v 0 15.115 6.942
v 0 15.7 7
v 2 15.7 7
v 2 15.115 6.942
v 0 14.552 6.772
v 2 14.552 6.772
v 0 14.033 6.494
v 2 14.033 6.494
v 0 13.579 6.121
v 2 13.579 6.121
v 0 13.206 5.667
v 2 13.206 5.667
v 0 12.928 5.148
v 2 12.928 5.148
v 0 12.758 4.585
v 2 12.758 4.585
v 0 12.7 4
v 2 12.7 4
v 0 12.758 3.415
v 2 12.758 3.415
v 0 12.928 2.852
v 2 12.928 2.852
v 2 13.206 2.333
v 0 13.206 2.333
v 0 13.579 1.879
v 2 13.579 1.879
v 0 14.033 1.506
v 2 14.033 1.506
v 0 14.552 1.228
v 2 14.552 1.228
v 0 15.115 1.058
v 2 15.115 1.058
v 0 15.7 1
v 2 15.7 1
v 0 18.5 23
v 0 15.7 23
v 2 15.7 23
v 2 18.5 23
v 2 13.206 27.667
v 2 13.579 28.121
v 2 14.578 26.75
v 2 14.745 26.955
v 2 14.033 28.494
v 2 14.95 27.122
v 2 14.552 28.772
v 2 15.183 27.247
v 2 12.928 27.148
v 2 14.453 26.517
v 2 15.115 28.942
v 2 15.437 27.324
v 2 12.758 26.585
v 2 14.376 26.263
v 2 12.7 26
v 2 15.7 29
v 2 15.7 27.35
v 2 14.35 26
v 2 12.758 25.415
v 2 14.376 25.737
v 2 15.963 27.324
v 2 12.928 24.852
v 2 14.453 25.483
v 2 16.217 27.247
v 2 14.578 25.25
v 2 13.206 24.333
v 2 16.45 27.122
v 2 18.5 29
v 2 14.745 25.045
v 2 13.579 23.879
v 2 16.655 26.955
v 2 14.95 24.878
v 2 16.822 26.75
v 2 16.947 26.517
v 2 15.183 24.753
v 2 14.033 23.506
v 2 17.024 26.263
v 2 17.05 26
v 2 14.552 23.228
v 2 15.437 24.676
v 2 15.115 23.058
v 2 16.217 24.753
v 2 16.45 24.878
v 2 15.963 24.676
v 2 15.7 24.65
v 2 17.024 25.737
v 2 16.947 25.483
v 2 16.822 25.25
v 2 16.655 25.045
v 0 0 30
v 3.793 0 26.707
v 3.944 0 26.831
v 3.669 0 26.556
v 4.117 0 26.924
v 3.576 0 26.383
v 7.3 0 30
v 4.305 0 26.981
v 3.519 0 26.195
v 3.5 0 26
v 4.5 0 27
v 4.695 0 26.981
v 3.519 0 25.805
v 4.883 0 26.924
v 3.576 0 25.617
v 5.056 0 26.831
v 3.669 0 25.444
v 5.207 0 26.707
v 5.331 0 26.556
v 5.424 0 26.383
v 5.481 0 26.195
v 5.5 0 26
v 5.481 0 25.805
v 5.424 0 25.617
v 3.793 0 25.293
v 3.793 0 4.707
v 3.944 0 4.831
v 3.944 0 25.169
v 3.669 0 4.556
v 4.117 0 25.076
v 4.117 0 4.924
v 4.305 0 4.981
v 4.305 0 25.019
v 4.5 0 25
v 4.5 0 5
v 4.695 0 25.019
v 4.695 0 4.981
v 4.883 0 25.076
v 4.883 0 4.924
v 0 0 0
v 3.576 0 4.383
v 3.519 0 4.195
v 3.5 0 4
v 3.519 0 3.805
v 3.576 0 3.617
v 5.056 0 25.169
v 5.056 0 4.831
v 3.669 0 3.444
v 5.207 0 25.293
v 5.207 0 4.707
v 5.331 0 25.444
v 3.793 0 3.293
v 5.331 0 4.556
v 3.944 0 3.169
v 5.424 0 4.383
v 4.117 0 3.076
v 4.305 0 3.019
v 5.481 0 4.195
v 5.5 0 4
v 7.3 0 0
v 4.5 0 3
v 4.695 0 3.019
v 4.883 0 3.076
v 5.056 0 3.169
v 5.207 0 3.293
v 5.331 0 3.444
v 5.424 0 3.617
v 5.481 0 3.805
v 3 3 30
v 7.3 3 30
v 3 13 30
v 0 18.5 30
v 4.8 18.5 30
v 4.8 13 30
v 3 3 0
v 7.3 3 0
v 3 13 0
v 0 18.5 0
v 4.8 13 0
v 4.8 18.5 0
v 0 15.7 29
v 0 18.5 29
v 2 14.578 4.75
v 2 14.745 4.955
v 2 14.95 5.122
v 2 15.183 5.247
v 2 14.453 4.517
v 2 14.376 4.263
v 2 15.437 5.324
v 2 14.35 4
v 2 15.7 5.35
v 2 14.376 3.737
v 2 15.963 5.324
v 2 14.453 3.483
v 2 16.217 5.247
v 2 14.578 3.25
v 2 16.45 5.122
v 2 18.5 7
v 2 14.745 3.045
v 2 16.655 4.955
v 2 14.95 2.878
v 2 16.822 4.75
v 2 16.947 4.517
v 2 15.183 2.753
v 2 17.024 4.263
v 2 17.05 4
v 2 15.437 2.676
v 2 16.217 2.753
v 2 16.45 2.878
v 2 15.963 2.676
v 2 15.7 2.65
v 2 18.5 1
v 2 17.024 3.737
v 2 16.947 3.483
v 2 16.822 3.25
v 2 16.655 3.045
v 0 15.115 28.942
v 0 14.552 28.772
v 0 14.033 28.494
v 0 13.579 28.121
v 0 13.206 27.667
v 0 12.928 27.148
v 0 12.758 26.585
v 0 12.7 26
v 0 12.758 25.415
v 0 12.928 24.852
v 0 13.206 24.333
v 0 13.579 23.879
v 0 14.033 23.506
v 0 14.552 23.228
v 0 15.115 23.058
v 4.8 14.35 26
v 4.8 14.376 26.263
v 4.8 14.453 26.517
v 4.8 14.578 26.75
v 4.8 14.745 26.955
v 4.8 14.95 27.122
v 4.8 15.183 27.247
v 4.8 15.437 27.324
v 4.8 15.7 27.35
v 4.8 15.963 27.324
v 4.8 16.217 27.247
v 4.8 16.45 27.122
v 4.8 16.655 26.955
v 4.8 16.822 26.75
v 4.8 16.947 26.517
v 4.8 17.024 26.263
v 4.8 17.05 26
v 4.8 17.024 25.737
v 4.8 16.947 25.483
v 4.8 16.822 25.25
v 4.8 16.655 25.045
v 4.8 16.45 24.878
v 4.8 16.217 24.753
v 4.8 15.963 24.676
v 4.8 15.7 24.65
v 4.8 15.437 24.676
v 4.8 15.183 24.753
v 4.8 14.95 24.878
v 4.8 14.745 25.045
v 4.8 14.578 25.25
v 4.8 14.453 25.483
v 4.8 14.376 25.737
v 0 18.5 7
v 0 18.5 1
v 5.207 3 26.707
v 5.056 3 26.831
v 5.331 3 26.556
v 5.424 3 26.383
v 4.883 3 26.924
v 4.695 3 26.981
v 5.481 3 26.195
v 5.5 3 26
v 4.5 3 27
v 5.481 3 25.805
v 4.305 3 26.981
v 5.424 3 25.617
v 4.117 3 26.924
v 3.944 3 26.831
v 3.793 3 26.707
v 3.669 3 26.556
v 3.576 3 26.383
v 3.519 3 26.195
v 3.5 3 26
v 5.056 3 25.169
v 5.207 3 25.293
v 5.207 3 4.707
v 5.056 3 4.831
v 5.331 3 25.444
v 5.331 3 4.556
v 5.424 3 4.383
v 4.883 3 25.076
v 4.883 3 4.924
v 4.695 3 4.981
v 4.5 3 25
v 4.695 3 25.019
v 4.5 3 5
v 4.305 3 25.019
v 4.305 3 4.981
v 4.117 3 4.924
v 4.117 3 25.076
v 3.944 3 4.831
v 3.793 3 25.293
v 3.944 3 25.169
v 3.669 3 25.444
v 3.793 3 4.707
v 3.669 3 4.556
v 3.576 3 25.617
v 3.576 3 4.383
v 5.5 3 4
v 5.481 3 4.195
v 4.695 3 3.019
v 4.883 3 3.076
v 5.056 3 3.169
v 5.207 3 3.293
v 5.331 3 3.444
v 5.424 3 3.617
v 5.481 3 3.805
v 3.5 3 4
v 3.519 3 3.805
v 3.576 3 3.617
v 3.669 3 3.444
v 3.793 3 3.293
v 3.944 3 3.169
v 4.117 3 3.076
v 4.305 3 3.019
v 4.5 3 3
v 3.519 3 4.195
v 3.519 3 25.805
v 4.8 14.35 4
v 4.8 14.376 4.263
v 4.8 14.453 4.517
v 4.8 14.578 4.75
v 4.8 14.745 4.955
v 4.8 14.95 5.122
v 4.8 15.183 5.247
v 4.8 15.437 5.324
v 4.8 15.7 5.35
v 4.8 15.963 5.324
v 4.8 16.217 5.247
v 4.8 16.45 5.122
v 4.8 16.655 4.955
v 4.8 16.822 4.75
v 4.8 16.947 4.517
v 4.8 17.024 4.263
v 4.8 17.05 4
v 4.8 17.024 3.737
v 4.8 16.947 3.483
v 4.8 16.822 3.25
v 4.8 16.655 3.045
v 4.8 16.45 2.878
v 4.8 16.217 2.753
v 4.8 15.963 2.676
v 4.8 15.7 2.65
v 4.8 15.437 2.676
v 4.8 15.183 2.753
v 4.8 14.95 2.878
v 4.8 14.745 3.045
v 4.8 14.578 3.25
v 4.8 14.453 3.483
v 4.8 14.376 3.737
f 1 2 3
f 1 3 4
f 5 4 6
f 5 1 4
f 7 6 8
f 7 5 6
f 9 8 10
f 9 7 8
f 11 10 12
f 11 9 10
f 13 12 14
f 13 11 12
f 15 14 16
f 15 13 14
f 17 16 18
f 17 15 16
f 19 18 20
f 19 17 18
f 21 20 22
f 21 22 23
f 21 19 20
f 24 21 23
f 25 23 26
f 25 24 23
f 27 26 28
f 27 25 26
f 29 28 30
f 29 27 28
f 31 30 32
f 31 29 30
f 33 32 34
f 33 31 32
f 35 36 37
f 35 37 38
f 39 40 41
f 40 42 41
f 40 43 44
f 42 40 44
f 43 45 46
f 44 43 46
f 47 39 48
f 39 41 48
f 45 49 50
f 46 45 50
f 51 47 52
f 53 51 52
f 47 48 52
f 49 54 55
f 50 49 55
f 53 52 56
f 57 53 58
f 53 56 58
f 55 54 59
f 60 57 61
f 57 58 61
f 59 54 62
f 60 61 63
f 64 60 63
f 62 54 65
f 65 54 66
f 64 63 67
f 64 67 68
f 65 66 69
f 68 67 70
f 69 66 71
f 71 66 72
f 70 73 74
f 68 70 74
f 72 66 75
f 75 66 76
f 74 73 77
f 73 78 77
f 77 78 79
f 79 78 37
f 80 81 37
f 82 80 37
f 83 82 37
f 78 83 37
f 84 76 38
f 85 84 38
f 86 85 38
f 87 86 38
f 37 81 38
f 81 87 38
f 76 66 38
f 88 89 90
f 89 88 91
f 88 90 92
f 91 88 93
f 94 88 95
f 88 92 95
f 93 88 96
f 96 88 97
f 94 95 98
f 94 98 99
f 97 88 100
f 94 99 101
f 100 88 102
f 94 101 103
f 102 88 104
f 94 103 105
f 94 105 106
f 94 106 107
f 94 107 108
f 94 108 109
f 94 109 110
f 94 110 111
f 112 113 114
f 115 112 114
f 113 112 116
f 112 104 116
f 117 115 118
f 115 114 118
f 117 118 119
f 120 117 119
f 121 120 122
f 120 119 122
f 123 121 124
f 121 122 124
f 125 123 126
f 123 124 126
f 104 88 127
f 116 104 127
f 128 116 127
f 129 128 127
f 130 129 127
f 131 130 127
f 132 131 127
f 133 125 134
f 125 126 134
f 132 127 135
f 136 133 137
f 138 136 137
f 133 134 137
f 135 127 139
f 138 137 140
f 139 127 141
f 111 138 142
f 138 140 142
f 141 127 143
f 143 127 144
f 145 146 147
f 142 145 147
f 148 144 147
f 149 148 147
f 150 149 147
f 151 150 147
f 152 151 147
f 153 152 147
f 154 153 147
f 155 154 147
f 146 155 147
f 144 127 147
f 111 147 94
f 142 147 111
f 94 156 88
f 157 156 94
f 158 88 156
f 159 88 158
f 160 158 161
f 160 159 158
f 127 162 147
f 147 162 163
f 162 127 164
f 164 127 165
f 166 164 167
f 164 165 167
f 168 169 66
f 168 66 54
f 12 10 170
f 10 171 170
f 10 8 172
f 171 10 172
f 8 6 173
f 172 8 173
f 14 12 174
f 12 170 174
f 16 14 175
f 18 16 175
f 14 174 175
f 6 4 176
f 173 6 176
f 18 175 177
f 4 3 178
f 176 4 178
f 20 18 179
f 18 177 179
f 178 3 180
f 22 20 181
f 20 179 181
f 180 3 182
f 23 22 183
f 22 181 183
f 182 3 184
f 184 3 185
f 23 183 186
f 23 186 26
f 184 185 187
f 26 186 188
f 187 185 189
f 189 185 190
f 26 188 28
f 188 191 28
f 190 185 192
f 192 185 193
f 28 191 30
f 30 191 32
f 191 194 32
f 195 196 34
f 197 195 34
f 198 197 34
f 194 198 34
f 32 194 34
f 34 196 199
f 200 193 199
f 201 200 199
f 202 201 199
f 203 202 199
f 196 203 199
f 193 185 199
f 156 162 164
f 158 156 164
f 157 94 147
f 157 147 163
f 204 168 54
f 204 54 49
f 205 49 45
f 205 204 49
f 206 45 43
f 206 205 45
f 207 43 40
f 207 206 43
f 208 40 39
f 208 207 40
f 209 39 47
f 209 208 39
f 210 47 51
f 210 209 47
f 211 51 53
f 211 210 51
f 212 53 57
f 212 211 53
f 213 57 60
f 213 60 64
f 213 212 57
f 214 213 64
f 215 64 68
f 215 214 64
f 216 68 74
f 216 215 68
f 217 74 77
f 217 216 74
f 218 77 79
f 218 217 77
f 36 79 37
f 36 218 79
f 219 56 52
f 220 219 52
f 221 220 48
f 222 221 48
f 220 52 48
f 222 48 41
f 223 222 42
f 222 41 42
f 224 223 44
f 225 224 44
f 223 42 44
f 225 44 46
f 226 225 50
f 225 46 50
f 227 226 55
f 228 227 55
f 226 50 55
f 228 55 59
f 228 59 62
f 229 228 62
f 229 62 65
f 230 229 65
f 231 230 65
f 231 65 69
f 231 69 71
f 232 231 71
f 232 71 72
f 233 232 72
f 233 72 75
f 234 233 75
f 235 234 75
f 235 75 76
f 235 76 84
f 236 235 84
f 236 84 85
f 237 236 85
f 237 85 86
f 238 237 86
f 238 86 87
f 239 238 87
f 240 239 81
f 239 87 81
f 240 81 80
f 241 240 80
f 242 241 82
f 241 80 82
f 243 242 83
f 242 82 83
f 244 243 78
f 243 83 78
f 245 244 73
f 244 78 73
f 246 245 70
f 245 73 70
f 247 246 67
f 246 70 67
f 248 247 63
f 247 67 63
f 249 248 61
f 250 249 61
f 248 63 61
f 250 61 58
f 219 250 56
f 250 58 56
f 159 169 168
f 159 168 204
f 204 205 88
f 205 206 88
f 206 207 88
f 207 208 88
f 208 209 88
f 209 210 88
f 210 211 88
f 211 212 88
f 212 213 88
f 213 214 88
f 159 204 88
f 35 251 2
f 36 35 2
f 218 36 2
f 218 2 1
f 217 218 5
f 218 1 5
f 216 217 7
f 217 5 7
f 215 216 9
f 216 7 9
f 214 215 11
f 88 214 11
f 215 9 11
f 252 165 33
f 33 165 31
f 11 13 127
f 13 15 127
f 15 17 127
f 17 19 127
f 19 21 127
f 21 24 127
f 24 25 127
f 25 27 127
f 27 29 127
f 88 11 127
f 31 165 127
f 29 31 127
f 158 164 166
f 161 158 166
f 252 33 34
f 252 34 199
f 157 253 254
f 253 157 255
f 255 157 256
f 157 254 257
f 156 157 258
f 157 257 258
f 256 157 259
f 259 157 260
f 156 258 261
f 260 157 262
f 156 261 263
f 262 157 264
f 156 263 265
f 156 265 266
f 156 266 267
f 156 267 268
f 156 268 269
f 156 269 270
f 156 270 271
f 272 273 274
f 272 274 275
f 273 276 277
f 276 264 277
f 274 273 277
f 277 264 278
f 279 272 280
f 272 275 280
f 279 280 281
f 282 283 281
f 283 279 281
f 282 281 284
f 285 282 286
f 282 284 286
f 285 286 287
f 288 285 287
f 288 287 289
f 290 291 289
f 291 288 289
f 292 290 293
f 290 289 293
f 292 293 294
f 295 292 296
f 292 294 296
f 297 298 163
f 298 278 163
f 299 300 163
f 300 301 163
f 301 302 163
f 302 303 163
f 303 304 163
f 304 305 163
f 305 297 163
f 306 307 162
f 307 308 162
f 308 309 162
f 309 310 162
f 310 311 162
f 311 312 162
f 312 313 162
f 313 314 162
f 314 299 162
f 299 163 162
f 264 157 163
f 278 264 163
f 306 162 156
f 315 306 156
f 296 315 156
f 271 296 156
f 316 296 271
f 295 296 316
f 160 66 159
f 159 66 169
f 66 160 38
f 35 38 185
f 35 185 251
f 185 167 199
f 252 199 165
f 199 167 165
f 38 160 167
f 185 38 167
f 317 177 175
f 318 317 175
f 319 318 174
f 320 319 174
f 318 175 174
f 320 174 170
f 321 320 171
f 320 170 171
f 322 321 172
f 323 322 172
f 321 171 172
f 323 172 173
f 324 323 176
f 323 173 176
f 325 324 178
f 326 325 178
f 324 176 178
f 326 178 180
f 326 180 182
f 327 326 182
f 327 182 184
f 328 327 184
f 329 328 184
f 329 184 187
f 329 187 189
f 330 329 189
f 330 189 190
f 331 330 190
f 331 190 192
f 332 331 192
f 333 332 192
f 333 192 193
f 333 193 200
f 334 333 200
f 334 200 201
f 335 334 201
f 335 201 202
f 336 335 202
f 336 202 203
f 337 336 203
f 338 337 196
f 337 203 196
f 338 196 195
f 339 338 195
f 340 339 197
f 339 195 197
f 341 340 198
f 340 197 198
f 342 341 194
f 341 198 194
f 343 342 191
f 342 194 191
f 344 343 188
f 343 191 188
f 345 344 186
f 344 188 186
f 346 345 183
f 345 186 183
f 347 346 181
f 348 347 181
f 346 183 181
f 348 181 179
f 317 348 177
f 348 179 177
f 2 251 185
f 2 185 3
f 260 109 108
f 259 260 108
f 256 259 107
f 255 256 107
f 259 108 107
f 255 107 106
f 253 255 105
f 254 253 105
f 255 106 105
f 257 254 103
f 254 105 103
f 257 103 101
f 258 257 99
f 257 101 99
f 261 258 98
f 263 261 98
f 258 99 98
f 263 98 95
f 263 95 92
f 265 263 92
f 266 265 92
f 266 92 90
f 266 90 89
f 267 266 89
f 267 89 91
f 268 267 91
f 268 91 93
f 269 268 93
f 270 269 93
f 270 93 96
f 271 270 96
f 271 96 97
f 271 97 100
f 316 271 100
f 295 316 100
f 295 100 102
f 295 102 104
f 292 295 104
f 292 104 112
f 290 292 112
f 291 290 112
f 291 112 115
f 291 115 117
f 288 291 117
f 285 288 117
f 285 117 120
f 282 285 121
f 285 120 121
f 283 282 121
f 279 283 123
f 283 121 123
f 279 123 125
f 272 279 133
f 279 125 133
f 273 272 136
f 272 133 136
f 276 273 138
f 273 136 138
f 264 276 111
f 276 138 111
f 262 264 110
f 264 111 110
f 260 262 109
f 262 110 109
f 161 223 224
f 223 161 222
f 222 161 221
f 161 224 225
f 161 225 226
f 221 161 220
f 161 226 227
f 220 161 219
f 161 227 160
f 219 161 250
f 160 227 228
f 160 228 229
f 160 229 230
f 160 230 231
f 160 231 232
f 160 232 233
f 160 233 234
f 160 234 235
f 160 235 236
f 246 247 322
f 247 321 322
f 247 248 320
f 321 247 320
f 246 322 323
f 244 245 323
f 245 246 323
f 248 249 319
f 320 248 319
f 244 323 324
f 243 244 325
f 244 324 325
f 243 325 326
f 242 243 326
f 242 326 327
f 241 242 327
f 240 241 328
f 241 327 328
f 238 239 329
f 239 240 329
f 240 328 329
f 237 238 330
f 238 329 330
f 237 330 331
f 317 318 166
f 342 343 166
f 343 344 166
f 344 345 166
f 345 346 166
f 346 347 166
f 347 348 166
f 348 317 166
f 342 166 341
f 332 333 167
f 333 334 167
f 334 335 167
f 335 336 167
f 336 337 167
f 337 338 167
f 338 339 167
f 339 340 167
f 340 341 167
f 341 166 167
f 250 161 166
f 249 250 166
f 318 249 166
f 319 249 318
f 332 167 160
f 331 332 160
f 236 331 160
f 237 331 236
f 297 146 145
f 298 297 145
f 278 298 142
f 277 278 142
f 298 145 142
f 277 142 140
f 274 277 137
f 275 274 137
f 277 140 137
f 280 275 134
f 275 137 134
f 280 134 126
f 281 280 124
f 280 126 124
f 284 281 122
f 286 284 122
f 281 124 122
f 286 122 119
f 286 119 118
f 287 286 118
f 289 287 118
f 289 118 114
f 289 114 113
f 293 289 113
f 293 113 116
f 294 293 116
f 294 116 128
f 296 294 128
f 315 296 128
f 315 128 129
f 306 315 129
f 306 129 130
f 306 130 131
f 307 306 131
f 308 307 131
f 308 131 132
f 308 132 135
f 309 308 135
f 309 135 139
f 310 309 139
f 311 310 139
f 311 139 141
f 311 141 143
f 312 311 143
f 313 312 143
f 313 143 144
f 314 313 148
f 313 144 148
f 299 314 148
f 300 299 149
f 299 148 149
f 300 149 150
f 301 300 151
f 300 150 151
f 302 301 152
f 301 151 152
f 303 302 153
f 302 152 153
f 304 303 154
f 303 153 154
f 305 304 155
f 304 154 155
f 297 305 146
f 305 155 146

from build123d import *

# Parameters (mm, degrees)
EXTRUDE_1_DEPTH     = 30
CUT_EXTRUDE_1_REACH = 37.994
SKETCH_2_R          = 1
CUT_EXTRUDE_2_REACH = 37.994
SKETCH_3_R          = 1.35
CUT_EXTRUDE_3_DEPTH = 2


with BuildPart() as part:
    # 草图1 → 凸台-拉伸1 (new body)
    with BuildSketch(Plane.XY):
        Polygon((0, 0), (7.3, 0), (7.3, 3), (3, 3), (3, 13), (4.8, 13), (4.8, 18.5), (0, 18.5), align=None)
    extrude(amount=EXTRUDE_1_DEPTH)

    # 草图2 → 切除-拉伸1 (cut, up to next)
    with BuildSketch(Plane.XZ, mode=Mode.PRIVATE) as cut_extrude_1_sk1:
        with Locations((4.5, 26)):
            Circle(SKETCH_2_R)
    cut_extrude_1_tool1 = extrude(cut_extrude_1_sk1.sketch, amount=-CUT_EXTRUDE_1_REACH, mode=Mode.PRIVATE) & part.part
    # 草图2 → 切除-拉伸1 (cut, up to next)
    with BuildSketch(Plane.XZ, mode=Mode.PRIVATE) as cut_extrude_1_sk2:
        with Locations((4.5, 4)):
            Circle(SKETCH_2_R)
    cut_extrude_1_tool2 = extrude(cut_extrude_1_sk2.sketch, amount=-CUT_EXTRUDE_1_REACH, mode=Mode.PRIVATE) & part.part
    add(cut_extrude_1_tool1.solids().sort_by_distance((4.5, 0, 26))[0], mode=Mode.SUBTRACT)
    add(cut_extrude_1_tool2.solids().sort_by_distance((4.5, 0, 4))[0], mode=Mode.SUBTRACT)

    # 草图3 → 切除-拉伸2 (cut, up to next)
    with BuildSketch(Plane.ZY, mode=Mode.PRIVATE) as cut_extrude_2_sk1:
        with Locations(Location((4, 15.7, 0), (0, 0, 270))):
            Circle(SKETCH_3_R)
    cut_extrude_2_tool1 = extrude(cut_extrude_2_sk1.sketch, amount=-CUT_EXTRUDE_2_REACH, mode=Mode.PRIVATE) & part.part
    # 草图3 → 切除-拉伸2 (cut, up to next)
    with BuildSketch(Plane.ZY, mode=Mode.PRIVATE) as cut_extrude_2_sk2:
        with Locations(Location((26, 15.7, 0), (0, 0, 270))):
            Circle(SKETCH_3_R)
    cut_extrude_2_tool2 = extrude(cut_extrude_2_sk2.sketch, amount=-CUT_EXTRUDE_2_REACH, mode=Mode.PRIVATE) & part.part
    add(cut_extrude_2_tool1.solids().sort_by_distance((0, 15.7, 4))[0], mode=Mode.SUBTRACT)
    add(cut_extrude_2_tool2.solids().sort_by_distance((0, 15.7, 26))[0], mode=Mode.SUBTRACT)

    # 草图4 → 切除-拉伸3 (cut)
    with BuildSketch(Plane.ZY):
        with BuildLine():
            Line((1, 15.7), (1, 18.7))
            Line((1, 18.7), (7, 18.7))
            Line((7, 18.7), (7, 15.7))
            ThreePointArc((7, 15.7), (4, 12.7), (1, 15.7))
        make_face()
        with BuildLine():
            Line((23, 15.7), (23, 20.006883846))
            Line((23, 20.006883846), (29, 20.006883846))
            Line((29, 20.006883846), (29, 15.7))
            ThreePointArc((29, 15.7), (26, 12.7), (23, 15.7))
        make_face()
    extrude(amount=-CUT_EXTRUDE_3_DEPTH, mode=Mode.SUBTRACT)


solid = part.part
